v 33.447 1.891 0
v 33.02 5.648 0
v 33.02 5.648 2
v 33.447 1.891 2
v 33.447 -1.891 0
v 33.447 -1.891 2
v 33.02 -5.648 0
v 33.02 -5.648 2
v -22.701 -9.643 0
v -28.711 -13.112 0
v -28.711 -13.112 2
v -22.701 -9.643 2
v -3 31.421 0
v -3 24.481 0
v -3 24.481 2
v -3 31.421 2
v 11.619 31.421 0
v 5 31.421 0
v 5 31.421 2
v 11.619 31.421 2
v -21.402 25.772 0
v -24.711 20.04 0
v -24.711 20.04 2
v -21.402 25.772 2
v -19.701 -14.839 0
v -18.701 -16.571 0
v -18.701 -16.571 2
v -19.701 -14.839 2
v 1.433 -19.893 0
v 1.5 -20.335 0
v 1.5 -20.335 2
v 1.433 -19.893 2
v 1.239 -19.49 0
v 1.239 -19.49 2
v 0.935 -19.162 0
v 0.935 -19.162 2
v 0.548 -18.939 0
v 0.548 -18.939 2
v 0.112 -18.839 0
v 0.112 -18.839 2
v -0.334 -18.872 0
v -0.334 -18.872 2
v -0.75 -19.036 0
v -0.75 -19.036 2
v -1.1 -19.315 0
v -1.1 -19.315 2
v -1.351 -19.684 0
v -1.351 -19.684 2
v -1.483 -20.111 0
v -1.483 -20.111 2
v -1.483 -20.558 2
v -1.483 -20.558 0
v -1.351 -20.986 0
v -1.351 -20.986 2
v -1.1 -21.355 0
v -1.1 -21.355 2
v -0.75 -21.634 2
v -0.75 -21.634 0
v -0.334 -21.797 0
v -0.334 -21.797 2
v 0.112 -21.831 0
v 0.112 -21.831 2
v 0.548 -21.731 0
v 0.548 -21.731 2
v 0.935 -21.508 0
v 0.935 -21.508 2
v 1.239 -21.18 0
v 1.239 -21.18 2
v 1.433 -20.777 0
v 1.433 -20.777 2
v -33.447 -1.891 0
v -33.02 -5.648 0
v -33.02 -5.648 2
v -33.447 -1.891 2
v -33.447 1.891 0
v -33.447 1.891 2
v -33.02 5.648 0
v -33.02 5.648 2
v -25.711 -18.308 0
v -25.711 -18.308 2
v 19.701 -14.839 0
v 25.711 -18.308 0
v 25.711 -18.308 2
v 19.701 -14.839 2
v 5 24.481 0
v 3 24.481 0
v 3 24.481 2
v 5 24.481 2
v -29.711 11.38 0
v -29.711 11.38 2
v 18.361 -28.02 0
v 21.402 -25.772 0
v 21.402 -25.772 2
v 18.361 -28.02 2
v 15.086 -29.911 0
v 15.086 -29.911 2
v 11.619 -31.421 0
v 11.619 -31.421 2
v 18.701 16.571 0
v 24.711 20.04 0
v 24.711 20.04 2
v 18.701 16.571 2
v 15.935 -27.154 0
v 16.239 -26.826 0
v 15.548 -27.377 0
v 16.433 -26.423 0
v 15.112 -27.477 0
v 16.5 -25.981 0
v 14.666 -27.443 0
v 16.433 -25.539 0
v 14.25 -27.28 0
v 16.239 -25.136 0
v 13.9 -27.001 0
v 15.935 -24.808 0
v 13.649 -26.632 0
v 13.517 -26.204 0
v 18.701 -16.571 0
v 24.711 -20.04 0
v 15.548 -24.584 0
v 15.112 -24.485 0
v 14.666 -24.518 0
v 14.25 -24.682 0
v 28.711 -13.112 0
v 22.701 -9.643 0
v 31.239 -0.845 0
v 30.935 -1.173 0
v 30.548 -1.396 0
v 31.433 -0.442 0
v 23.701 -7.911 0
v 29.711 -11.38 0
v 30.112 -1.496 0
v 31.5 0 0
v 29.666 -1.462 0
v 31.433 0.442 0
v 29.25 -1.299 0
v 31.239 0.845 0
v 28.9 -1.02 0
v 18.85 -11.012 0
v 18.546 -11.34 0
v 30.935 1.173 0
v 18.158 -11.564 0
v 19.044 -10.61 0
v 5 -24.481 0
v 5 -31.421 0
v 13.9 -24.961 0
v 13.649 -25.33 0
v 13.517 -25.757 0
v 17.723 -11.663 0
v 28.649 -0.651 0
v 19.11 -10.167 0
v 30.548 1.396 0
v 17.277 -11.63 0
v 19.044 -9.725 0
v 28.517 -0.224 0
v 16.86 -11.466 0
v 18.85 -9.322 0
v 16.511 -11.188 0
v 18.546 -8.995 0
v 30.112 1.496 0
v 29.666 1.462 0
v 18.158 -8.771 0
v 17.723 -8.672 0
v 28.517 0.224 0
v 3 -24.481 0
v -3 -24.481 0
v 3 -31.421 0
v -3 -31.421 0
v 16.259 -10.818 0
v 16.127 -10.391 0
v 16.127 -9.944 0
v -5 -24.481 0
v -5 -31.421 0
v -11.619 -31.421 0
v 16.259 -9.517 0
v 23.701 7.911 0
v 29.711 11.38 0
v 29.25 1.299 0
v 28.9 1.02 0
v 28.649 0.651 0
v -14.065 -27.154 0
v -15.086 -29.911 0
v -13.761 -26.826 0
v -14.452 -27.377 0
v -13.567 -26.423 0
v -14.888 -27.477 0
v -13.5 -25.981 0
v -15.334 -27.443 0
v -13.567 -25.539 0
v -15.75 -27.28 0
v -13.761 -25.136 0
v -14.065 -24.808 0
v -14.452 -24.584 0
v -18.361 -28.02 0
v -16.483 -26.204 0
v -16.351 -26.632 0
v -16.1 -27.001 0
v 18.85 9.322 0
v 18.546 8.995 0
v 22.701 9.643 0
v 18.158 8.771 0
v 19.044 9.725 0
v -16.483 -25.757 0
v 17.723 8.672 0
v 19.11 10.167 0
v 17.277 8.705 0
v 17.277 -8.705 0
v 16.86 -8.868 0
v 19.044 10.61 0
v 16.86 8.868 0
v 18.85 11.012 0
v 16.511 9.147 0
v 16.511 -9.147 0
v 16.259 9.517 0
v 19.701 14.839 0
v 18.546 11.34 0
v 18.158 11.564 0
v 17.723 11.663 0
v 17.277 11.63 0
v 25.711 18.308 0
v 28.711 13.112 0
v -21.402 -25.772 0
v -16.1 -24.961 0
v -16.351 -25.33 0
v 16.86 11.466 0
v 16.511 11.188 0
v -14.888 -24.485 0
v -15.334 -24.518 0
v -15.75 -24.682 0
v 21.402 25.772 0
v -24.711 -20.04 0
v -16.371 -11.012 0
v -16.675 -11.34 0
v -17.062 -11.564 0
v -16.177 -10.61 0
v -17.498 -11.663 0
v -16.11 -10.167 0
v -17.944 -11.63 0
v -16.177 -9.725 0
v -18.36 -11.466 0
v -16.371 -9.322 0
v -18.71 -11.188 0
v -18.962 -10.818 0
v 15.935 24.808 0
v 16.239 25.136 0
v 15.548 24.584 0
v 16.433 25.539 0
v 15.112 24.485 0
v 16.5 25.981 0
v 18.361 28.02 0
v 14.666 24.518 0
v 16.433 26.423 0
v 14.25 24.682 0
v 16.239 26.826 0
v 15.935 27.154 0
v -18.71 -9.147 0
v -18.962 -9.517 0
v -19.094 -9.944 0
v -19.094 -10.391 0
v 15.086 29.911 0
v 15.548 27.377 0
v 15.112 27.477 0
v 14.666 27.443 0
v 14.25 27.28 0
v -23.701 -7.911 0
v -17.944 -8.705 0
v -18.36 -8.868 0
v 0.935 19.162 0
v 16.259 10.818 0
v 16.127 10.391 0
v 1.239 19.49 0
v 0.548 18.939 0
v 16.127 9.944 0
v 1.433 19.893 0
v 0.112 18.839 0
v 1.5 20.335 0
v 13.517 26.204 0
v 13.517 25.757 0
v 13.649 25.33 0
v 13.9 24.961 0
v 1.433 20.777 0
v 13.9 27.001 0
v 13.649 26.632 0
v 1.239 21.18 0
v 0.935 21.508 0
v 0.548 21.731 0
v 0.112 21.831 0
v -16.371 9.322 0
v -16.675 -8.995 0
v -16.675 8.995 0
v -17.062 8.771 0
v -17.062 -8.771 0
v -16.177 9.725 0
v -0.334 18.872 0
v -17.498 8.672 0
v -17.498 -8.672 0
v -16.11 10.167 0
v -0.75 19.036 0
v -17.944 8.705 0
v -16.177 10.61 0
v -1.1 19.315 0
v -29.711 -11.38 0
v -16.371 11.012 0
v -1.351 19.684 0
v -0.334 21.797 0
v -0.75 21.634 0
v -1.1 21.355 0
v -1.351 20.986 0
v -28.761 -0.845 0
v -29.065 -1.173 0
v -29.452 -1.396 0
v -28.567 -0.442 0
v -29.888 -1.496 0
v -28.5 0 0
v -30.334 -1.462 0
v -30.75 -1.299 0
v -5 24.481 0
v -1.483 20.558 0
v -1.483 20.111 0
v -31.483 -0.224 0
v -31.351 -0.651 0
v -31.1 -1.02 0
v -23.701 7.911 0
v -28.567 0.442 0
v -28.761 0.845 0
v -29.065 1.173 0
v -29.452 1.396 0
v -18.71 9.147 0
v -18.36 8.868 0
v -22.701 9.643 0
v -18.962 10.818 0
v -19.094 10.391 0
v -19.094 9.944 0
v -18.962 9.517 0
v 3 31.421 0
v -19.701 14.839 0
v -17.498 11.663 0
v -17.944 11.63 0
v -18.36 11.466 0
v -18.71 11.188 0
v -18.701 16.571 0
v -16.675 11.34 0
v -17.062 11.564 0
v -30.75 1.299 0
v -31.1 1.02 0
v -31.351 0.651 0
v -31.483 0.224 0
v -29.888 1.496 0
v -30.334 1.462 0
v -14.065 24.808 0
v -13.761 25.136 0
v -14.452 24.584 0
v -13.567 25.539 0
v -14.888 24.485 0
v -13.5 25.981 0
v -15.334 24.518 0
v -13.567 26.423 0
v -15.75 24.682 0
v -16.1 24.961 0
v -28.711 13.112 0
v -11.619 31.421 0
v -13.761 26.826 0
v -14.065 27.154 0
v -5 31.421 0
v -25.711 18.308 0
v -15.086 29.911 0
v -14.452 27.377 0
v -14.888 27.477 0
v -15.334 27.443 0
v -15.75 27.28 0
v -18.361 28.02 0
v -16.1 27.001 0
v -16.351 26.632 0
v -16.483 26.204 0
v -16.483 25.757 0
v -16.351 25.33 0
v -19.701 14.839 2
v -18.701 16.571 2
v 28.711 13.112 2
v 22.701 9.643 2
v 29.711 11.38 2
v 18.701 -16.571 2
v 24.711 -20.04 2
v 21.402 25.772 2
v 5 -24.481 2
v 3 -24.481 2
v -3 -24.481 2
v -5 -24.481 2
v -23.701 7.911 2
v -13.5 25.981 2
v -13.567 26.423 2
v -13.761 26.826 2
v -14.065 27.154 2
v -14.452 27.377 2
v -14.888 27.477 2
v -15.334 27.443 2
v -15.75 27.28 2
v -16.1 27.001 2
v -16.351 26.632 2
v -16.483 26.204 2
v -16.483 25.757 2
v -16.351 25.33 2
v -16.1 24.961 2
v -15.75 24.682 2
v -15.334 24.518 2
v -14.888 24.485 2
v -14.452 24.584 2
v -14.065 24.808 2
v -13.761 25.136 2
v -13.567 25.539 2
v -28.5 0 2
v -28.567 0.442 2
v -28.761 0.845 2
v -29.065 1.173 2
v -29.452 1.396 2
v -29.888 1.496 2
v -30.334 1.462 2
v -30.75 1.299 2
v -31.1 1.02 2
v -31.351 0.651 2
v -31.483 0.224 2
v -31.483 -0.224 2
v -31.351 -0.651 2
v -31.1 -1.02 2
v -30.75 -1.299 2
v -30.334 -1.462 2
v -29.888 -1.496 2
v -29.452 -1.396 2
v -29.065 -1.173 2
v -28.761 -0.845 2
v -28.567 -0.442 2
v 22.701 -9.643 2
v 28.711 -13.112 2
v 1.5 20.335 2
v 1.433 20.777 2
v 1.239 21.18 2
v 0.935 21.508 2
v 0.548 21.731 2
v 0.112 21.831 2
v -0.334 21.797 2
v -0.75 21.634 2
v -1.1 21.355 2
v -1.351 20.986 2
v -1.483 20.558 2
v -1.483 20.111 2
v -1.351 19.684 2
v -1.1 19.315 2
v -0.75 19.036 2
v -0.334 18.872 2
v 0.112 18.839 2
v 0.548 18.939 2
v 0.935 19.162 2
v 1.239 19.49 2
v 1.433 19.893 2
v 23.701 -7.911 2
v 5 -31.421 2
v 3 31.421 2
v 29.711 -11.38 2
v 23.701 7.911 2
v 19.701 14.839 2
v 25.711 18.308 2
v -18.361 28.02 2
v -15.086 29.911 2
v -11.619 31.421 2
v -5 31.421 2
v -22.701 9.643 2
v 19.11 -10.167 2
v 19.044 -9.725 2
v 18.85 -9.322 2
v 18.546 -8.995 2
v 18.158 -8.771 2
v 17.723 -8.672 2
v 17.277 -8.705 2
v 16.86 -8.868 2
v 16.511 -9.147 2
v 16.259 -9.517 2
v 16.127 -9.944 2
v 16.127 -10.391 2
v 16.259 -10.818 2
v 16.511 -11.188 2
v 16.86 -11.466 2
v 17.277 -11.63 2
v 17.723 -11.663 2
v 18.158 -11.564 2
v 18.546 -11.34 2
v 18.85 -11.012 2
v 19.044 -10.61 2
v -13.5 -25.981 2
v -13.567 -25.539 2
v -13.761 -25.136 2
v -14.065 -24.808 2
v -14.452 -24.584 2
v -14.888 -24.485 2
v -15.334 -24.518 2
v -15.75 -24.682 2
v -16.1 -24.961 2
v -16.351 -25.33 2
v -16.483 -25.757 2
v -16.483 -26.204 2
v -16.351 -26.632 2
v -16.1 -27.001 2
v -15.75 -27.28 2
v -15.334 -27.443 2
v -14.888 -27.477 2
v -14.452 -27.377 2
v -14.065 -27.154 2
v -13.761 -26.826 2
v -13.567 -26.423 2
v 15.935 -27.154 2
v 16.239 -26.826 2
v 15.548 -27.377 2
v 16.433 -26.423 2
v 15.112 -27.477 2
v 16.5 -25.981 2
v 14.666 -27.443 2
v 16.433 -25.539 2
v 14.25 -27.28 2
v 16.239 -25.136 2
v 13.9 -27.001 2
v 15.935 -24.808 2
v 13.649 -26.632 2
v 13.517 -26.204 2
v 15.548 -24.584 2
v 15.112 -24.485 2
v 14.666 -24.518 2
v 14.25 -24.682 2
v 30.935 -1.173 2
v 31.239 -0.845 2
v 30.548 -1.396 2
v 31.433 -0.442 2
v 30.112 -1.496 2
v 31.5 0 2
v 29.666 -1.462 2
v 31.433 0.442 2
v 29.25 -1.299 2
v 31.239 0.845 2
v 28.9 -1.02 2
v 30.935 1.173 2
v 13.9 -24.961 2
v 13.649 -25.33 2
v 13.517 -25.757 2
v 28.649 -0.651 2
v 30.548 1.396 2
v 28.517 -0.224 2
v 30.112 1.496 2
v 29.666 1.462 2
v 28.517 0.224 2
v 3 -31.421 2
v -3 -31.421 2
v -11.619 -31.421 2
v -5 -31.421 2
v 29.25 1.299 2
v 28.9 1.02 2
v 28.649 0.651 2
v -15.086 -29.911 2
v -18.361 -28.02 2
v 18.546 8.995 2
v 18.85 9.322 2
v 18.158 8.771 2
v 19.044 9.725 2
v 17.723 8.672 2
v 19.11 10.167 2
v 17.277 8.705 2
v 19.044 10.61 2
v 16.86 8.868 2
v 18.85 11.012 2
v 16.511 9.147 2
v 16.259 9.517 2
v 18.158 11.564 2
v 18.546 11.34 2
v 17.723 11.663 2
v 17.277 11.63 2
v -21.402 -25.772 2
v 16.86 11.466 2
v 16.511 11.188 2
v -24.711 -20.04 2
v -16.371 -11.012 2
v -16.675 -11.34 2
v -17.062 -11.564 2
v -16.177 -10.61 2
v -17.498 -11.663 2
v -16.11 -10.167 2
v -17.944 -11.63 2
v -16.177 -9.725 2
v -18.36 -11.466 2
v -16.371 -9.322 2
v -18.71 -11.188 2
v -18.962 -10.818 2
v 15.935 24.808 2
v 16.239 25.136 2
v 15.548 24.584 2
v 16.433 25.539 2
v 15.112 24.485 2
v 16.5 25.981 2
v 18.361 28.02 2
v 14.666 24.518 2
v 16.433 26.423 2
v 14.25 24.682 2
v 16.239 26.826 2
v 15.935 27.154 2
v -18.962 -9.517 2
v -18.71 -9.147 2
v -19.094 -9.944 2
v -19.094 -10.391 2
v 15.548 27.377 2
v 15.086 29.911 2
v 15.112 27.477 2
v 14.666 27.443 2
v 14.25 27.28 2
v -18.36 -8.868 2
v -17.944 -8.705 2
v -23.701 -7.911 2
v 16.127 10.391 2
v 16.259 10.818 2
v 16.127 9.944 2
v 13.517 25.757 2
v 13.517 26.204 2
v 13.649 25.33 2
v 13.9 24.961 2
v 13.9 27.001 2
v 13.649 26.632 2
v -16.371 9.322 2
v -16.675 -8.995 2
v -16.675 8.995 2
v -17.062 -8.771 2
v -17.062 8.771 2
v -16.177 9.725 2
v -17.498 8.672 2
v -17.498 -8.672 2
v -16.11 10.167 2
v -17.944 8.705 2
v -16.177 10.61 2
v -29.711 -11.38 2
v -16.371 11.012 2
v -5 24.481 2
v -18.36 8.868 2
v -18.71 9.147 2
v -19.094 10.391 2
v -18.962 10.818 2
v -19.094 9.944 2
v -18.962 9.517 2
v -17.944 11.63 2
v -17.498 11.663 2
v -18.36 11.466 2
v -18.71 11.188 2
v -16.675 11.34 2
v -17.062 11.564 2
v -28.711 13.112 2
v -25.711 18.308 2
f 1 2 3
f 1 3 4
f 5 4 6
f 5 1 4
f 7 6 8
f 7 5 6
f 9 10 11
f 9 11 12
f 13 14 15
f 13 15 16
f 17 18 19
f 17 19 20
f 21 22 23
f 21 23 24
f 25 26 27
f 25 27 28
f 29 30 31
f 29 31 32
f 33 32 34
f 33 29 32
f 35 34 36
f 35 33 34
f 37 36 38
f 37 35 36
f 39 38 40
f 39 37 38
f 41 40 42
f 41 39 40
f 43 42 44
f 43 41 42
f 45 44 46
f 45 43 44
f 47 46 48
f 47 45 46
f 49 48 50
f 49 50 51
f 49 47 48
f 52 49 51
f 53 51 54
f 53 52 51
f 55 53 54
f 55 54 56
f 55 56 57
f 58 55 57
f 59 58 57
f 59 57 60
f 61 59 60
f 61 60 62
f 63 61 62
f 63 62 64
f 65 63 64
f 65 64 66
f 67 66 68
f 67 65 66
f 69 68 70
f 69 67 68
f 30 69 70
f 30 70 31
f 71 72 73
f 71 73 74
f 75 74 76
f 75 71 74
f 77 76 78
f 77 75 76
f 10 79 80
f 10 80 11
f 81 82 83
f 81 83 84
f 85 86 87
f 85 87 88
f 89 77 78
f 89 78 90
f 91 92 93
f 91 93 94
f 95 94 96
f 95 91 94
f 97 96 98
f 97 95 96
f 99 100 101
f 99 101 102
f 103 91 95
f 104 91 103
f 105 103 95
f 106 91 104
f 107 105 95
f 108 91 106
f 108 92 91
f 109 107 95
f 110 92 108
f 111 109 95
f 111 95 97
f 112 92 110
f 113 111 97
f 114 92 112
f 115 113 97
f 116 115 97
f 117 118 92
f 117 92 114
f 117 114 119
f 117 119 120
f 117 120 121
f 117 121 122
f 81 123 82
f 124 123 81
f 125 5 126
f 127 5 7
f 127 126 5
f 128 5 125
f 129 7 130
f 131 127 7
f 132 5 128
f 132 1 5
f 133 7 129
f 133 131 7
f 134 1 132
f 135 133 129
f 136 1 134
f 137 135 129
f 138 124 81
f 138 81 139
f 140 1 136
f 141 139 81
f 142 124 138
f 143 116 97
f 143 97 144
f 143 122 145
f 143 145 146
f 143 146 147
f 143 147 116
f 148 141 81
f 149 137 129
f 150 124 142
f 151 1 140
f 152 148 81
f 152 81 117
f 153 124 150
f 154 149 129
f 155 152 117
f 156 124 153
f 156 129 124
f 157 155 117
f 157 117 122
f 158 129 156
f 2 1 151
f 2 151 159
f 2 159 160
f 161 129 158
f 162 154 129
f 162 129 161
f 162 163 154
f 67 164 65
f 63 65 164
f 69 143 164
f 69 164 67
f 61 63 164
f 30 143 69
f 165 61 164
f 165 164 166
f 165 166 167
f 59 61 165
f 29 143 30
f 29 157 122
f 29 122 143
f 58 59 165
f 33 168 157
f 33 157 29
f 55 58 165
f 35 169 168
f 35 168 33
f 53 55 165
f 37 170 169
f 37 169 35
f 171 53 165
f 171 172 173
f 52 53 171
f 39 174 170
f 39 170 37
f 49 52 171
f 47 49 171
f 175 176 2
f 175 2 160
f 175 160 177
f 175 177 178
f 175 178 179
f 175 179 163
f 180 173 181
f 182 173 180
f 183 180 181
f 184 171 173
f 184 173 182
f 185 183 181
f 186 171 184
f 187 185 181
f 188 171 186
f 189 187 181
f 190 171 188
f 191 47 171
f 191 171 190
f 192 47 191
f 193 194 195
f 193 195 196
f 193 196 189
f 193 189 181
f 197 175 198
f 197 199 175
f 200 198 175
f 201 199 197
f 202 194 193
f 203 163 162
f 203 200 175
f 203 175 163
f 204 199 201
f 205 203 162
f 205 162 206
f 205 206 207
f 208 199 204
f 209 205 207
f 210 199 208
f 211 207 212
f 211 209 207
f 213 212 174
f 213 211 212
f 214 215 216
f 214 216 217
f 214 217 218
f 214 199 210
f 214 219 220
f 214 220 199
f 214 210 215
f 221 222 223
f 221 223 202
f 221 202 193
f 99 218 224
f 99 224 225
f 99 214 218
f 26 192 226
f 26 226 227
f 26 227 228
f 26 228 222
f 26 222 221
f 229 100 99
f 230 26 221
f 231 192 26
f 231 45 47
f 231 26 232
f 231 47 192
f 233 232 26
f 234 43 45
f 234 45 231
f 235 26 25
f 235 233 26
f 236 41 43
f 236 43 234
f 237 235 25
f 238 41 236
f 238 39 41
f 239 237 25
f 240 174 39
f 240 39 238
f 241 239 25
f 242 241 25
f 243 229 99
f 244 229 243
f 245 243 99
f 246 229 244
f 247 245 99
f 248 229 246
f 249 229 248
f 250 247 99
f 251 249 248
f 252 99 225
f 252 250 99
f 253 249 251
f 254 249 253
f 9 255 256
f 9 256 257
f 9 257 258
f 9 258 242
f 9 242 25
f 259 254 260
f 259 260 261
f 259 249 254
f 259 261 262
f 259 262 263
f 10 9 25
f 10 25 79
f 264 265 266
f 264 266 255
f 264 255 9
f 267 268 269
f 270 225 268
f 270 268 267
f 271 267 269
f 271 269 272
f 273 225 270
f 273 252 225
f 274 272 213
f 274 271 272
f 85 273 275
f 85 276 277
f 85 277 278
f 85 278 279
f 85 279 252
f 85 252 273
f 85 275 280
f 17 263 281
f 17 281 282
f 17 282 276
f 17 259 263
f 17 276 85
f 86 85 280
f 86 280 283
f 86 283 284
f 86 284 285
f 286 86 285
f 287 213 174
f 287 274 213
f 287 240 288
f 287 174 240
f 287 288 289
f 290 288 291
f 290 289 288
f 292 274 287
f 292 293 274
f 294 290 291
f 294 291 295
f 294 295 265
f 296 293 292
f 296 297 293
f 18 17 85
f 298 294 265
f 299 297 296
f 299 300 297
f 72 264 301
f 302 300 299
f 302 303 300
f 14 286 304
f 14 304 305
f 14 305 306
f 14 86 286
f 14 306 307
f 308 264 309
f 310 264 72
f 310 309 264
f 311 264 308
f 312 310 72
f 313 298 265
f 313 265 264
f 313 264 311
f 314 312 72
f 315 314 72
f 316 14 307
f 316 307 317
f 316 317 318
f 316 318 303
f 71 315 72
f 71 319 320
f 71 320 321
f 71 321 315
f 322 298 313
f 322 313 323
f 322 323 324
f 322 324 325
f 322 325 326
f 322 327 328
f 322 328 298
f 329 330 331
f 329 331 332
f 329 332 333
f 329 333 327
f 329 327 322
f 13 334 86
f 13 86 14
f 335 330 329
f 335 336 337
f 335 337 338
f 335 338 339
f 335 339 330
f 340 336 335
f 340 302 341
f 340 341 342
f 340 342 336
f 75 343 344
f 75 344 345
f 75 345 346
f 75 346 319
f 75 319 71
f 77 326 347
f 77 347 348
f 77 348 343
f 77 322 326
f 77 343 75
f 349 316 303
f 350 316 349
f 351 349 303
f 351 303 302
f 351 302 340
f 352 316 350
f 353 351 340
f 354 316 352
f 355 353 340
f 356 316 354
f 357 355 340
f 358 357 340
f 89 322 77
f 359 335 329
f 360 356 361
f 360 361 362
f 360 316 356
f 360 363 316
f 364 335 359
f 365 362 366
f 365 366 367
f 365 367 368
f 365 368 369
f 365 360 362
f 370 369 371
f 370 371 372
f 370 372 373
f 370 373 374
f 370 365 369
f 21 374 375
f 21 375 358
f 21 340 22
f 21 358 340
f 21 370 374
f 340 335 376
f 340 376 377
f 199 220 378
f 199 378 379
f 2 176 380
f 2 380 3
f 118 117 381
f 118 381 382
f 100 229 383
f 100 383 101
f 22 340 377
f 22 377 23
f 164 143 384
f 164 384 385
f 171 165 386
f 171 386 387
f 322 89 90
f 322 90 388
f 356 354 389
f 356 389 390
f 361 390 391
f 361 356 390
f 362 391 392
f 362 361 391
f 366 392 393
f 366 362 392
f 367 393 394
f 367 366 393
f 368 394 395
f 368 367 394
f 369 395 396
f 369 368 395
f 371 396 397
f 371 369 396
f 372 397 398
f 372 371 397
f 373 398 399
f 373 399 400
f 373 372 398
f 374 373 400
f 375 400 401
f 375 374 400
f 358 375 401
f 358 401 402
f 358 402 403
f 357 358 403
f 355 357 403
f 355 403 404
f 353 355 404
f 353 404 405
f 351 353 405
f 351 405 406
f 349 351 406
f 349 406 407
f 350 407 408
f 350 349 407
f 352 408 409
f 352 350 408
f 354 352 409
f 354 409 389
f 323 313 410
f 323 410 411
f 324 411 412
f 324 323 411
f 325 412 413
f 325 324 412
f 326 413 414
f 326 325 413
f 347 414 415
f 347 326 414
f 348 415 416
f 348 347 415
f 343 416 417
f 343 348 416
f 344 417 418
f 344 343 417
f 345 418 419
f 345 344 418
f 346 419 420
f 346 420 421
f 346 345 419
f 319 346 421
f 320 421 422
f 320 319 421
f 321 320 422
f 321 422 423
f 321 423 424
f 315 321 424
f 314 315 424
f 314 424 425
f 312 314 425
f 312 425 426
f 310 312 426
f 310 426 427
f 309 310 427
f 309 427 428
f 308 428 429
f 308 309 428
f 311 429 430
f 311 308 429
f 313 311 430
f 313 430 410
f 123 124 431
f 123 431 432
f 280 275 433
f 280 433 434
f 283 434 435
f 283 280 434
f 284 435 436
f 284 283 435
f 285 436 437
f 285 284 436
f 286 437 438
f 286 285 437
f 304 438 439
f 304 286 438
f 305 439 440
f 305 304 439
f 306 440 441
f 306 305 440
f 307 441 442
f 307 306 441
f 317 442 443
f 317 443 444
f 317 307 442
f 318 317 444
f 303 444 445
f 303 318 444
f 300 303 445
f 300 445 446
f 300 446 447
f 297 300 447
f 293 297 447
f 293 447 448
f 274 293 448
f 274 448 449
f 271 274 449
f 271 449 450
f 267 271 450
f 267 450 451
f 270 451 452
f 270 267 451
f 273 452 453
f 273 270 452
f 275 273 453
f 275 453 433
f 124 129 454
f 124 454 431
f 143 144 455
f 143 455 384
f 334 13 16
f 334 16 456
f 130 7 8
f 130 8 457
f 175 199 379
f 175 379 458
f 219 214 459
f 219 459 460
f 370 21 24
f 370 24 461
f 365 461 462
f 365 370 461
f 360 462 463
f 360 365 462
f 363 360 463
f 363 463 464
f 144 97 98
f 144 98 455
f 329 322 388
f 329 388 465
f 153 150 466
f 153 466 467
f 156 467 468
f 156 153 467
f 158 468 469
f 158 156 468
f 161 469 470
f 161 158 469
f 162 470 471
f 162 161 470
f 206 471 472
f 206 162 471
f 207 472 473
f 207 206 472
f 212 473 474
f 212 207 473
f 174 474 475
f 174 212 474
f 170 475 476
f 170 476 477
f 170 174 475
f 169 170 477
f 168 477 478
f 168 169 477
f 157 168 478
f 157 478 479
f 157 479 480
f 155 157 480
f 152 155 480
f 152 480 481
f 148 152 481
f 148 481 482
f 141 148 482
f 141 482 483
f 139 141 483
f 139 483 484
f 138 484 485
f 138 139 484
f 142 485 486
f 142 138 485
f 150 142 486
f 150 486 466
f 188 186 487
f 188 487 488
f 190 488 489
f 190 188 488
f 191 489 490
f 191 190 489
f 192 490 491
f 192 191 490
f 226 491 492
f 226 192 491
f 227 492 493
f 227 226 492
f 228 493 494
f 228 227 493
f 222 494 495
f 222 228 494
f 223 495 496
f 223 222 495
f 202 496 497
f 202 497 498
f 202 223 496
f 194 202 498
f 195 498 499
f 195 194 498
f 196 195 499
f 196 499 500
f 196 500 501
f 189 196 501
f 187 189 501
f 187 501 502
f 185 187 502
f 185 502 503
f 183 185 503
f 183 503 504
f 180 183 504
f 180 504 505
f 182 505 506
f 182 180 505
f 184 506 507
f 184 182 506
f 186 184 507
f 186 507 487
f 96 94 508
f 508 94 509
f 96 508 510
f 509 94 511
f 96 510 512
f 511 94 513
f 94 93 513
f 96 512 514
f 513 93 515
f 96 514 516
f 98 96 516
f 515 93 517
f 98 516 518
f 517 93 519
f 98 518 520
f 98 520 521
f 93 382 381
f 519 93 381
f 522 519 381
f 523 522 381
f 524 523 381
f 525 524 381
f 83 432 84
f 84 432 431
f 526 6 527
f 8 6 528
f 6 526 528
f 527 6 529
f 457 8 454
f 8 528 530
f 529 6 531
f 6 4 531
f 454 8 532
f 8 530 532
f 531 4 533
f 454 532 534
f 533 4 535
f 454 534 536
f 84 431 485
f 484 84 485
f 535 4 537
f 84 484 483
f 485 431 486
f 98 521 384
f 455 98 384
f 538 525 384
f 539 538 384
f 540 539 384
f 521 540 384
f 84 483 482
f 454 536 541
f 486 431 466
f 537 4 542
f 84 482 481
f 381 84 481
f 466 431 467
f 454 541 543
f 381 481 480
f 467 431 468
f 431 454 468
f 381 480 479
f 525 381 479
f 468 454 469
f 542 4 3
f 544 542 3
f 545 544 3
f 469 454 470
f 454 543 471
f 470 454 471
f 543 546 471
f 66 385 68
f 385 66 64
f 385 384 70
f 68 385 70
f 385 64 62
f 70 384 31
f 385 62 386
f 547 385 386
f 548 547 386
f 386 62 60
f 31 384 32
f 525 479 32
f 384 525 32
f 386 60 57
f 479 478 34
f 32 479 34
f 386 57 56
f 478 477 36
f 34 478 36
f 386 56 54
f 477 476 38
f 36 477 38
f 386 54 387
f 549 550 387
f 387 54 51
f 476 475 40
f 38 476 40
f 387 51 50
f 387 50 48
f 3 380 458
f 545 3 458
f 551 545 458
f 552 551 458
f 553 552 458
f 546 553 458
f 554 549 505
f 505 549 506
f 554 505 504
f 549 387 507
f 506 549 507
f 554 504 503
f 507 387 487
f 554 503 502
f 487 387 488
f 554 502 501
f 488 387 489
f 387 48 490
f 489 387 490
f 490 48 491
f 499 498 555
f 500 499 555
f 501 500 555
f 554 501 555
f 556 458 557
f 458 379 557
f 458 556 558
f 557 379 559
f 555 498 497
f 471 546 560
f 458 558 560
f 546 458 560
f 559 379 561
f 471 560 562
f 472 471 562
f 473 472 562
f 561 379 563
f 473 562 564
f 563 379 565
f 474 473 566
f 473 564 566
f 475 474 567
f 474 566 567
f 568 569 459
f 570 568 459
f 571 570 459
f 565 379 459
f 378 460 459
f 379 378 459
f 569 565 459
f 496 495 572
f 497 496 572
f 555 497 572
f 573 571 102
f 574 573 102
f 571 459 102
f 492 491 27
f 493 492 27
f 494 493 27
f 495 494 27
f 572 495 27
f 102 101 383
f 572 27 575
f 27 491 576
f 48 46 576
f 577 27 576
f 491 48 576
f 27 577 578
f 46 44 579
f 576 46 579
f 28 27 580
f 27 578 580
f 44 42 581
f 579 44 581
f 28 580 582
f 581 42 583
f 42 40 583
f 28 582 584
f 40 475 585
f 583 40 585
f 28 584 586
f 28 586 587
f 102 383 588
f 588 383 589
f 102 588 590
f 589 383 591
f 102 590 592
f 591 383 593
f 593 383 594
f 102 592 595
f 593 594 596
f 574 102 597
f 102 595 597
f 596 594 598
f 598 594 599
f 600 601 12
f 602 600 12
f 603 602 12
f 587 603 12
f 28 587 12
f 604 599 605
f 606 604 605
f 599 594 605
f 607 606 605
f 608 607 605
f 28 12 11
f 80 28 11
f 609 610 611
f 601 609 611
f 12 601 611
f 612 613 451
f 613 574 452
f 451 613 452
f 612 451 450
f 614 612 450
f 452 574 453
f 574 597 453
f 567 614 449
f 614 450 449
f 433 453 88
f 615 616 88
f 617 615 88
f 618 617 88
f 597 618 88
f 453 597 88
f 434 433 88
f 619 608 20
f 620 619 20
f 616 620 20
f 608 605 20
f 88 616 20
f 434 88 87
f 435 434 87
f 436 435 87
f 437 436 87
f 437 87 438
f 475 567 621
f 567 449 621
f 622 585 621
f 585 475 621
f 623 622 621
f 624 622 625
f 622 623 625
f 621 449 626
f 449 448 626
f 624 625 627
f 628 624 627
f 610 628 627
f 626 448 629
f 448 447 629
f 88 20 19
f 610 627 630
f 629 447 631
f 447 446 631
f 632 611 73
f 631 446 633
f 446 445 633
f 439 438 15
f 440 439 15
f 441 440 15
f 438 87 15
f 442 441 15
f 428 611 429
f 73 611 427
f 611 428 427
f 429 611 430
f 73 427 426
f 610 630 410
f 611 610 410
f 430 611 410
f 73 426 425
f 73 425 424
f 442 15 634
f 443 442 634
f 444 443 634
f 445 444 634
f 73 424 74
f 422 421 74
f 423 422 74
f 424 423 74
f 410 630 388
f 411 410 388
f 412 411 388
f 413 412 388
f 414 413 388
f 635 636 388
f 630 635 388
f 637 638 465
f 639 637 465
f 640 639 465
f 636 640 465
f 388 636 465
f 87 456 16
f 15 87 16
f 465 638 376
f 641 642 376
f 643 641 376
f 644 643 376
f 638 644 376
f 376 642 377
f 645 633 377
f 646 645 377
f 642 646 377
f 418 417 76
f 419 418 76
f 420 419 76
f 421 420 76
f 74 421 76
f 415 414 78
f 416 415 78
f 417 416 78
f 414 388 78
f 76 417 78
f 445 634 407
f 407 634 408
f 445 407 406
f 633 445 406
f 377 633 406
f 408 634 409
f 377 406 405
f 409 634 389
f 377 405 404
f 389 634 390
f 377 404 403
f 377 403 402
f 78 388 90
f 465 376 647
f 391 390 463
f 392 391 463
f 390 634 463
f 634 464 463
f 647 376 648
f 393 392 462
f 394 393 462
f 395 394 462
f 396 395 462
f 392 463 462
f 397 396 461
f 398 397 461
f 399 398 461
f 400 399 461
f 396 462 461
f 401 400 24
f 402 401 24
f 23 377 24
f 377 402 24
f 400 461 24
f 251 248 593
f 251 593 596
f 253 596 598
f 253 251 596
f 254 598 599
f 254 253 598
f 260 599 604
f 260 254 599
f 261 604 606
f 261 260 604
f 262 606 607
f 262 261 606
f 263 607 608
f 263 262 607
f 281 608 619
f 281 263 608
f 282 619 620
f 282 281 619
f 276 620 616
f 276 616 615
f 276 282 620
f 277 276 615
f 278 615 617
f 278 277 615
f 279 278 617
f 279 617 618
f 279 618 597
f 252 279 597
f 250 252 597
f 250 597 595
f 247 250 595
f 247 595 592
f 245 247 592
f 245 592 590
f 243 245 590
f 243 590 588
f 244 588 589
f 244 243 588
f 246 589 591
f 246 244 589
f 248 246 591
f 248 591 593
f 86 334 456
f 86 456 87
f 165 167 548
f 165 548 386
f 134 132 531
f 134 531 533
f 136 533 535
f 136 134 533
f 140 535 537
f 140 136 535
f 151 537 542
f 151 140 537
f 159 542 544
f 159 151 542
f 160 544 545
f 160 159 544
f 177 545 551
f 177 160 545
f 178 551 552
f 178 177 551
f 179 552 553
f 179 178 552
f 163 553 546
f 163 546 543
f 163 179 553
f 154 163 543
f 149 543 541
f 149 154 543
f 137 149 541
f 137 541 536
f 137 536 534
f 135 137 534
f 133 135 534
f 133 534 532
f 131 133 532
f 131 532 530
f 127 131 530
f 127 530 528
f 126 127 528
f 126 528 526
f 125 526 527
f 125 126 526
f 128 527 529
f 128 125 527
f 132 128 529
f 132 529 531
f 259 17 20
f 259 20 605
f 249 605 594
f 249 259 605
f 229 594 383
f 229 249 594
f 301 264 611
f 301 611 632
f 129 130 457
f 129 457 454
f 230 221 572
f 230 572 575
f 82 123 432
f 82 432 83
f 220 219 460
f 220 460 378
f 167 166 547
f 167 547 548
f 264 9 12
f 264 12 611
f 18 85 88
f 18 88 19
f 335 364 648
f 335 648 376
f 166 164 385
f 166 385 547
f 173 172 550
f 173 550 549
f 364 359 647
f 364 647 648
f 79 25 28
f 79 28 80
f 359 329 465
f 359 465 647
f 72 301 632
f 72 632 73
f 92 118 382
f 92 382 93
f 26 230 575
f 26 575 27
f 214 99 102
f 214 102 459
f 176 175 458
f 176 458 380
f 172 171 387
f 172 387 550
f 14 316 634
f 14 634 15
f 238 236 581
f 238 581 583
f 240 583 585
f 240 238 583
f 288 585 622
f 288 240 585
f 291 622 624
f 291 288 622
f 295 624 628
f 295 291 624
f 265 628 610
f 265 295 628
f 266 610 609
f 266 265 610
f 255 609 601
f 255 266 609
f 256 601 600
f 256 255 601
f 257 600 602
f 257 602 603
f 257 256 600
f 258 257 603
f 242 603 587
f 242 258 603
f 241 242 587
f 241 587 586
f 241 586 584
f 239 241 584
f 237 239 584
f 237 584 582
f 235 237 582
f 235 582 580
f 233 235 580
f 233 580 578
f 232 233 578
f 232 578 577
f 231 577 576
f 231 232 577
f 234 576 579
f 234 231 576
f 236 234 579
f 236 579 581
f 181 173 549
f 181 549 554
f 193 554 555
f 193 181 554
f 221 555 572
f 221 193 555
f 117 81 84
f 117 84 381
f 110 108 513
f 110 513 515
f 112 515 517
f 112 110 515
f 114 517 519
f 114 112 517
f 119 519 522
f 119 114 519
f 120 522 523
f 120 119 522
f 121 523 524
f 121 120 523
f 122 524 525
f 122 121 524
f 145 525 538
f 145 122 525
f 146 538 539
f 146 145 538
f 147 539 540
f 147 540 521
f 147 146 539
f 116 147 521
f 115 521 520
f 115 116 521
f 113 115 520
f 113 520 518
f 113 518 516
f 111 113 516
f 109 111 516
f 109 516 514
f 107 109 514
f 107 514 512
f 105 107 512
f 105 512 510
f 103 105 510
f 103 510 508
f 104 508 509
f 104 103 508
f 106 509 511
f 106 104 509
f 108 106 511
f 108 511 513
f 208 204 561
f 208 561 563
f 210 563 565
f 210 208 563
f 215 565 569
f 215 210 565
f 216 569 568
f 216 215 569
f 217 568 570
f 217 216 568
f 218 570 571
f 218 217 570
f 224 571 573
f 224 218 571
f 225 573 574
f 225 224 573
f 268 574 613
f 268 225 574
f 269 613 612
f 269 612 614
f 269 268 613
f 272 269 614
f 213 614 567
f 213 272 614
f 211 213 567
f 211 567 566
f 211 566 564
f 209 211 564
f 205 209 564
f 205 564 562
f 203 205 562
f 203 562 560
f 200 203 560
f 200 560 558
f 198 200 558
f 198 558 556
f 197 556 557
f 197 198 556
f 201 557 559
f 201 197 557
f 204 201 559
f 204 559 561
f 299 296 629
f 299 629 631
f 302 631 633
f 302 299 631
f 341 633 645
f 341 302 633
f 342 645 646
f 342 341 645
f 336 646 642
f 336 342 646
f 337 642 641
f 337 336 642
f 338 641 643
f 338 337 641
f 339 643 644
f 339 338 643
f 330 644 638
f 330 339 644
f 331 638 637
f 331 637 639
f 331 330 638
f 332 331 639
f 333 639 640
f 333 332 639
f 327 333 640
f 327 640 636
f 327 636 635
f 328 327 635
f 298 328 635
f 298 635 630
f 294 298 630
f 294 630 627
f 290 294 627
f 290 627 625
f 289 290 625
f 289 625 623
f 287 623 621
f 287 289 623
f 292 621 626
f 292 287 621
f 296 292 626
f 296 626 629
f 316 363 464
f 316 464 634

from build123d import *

# Parameters (mm, degrees)
MODEL_R             = 1.5
BOSS_EXTRUDE1_DEPTH = 2


with BuildPart() as part:
    # Model → Boss-Extrude1 (new body)
    with BuildSketch(Plane.XY):
        with BuildLine():
            Line((-18.701410202, -16.570766906), (-19.701410202, -14.838716098))
            Line((-19.701410202, -14.838716098), (-25.711054778, -18.308386013))
            Line((-25.711054778, -18.308386013), (-28.711054778, -13.11223359))
            Line((-28.711054778, -13.11223359), (-22.701410202, -9.642563676))
            Line((-22.701410202, -9.642563676), (-23.701410202, -7.910512868))
            Line((-23.701410202, -7.910512868), (-29.711054778, -11.380182782))
            Line((-29.711054778, -11.380182782), (-33.02041498, -5.648202773))
            ThreePointArc((-33.02041498, -5.648202773), (-33.5, 0), (-33.02041498, 5.648202773))
            Line((-33.02041498, 5.648202773), (-29.711054778, 11.380182782))
            Line((-29.711054778, 11.380182782), (-23.701410202, 7.910512868))
            Line((-23.701410202, 7.910512868), (-22.701410202, 9.642563676))
            Line((-22.701410202, 9.642563676), (-28.711054778, 13.11223359))
            Line((-28.711054778, 13.11223359), (-25.711054778, 18.308386013))
            Line((-25.711054778, 18.308386013), (-19.701410202, 14.838716098))
            Line((-19.701410202, 14.838716098), (-18.701410202, 16.570766906))
            Line((-18.701410202, 16.570766906), (-24.711054778, 20.04043682))
            Line((-24.711054778, 20.04043682), (-21.401694577, 25.77241683))
            ThreePointArc((-21.401694577, 25.77241683), (-16.75, 29.011851027), (-11.618720403, 31.420619602))
            Line((-11.618720403, 31.420619602), (-5, 31.420619602))
            Line((-5, 31.420619602), (-5, 24.481279774))
            Line((-5, 24.481279774), (-3, 24.481279774))
            Line((-3, 24.481279774), (-3, 31.420619602))
            Line((-3, 31.420619602), (3, 31.420619602))
            Line((3, 31.420619602), (3, 24.481279774))
            Line((3, 24.481279774), (5, 24.481279774))
            Line((5, 24.481279774), (5, 31.420619602))
            Line((5, 31.420619602), (11.618720403, 31.420619602))
            ThreePointArc((11.618720403, 31.420619602), (16.75, 29.011851027), (21.401694577, 25.77241683))
            Line((21.401694577, 25.77241683), (24.711054778, 20.04043682))
            Line((24.711054778, 20.04043682), (18.701410202, 16.570766906))
            Line((18.701410202, 16.570766906), (19.701410202, 14.838716098))
            Line((19.701410202, 14.838716098), (25.711054778, 18.308386013))
            Line((25.711054778, 18.308386013), (28.711054778, 13.11223359))
            Line((28.711054778, 13.11223359), (22.701410202, 9.642563676))
            Line((22.701410202, 9.642563676), (23.701410202, 7.910512868))
            Line((23.701410202, 7.910512868), (29.711054778, 11.380182782))
            Line((29.711054778, 11.380182782), (33.02041498, 5.648202773))
            ThreePointArc((33.02041498, 5.648202773), (33.5, 0), (33.02041498, -5.648202773))
            Line((33.02041498, -5.648202773), (29.711054778, -11.380182782))
            Line((29.711054778, -11.380182782), (23.701410202, -7.910512868))
            Line((23.701410202, -7.910512868), (22.701410202, -9.642563676))
            Line((22.701410202, -9.642563676), (28.711054778, -13.11223359))
            Line((28.711054778, -13.11223359), (25.711054778, -18.308386013))
            Line((25.711054778, -18.308386013), (19.701410202, -14.838716098))
            Line((19.701410202, -14.838716098), (18.701410202, -16.570766906))
            Line((18.701410202, -16.570766906), (24.711054778, -20.04043682))
            Line((24.711054778, -20.04043682), (21.401694577, -25.77241683))
            ThreePointArc((21.401694577, -25.77241683), (16.75, -29.011851027), (11.618720403, -31.420619602))
            Line((11.618720403, -31.420619602), (5, -31.420619602))
            Line((5, -31.420619602), (5, -24.481279774))
            Line((5, -24.481279774), (3, -24.481279774))
            Line((3, -24.481279774), (3, -31.420619602))
            Line((3, -31.420619602), (-3, -31.420619602))
            Line((-3, -31.420619602), (-3, -24.481279774))
            Line((-3, -24.481279774), (-5, -24.481279774))
            Line((-5, -24.481279774), (-5, -31.420619602))
            Line((-5, -31.420619602), (-11.618720403, -31.420619602))
            ThreePointArc((-11.618720403, -31.420619602), (-16.75, -29.011851027), (-21.401694577, -25.77241683))
            Line((-21.401694577, -25.77241683), (-24.711054778, -20.04043682))
            Line((-24.711054778, -20.04043682), (-18.701410202, -16.570766906))
        make_face()
        with Locations((-17.610482102, -10.167416582)):
            Circle(MODEL_R, mode=Mode.SUBTRACT)
        with Locations((-17.610482102, 10.167416582)):
            Circle(MODEL_R, mode=Mode.SUBTRACT)
        with Locations((0, -20.334833165)):
            Circle(MODEL_R, mode=Mode.SUBTRACT)
        with Locations((17.610482102, -10.167416582)):
            Circle(MODEL_R, mode=Mode.SUBTRACT)
        with Locations((0, 20.334833165)):
            Circle(MODEL_R, mode=Mode.SUBTRACT)
        with Locations((-30, 0)):
            Circle(MODEL_R, mode=Mode.SUBTRACT)
        with Locations((-15, -25.980762114)):
            Circle(MODEL_R, mode=Mode.SUBTRACT)
        with Locations((15, 25.980762114)):
            Circle(MODEL_R, mode=Mode.SUBTRACT)
        with Locations((-15, 25.980762114)):
            Circle(MODEL_R, mode=Mode.SUBTRACT)
        with Locations((15, -25.980762114)):
            Circle(MODEL_R, mode=Mode.SUBTRACT)
        with Locations((30, 0)):
            Circle(MODEL_R, mode=Mode.SUBTRACT)
        with Locations((17.610482102, 10.167416582)):
            Circle(MODEL_R, mode=Mode.SUBTRACT)
    extrude(amount=BOSS_EXTRUDE1_DEPTH)


solid = part.part
